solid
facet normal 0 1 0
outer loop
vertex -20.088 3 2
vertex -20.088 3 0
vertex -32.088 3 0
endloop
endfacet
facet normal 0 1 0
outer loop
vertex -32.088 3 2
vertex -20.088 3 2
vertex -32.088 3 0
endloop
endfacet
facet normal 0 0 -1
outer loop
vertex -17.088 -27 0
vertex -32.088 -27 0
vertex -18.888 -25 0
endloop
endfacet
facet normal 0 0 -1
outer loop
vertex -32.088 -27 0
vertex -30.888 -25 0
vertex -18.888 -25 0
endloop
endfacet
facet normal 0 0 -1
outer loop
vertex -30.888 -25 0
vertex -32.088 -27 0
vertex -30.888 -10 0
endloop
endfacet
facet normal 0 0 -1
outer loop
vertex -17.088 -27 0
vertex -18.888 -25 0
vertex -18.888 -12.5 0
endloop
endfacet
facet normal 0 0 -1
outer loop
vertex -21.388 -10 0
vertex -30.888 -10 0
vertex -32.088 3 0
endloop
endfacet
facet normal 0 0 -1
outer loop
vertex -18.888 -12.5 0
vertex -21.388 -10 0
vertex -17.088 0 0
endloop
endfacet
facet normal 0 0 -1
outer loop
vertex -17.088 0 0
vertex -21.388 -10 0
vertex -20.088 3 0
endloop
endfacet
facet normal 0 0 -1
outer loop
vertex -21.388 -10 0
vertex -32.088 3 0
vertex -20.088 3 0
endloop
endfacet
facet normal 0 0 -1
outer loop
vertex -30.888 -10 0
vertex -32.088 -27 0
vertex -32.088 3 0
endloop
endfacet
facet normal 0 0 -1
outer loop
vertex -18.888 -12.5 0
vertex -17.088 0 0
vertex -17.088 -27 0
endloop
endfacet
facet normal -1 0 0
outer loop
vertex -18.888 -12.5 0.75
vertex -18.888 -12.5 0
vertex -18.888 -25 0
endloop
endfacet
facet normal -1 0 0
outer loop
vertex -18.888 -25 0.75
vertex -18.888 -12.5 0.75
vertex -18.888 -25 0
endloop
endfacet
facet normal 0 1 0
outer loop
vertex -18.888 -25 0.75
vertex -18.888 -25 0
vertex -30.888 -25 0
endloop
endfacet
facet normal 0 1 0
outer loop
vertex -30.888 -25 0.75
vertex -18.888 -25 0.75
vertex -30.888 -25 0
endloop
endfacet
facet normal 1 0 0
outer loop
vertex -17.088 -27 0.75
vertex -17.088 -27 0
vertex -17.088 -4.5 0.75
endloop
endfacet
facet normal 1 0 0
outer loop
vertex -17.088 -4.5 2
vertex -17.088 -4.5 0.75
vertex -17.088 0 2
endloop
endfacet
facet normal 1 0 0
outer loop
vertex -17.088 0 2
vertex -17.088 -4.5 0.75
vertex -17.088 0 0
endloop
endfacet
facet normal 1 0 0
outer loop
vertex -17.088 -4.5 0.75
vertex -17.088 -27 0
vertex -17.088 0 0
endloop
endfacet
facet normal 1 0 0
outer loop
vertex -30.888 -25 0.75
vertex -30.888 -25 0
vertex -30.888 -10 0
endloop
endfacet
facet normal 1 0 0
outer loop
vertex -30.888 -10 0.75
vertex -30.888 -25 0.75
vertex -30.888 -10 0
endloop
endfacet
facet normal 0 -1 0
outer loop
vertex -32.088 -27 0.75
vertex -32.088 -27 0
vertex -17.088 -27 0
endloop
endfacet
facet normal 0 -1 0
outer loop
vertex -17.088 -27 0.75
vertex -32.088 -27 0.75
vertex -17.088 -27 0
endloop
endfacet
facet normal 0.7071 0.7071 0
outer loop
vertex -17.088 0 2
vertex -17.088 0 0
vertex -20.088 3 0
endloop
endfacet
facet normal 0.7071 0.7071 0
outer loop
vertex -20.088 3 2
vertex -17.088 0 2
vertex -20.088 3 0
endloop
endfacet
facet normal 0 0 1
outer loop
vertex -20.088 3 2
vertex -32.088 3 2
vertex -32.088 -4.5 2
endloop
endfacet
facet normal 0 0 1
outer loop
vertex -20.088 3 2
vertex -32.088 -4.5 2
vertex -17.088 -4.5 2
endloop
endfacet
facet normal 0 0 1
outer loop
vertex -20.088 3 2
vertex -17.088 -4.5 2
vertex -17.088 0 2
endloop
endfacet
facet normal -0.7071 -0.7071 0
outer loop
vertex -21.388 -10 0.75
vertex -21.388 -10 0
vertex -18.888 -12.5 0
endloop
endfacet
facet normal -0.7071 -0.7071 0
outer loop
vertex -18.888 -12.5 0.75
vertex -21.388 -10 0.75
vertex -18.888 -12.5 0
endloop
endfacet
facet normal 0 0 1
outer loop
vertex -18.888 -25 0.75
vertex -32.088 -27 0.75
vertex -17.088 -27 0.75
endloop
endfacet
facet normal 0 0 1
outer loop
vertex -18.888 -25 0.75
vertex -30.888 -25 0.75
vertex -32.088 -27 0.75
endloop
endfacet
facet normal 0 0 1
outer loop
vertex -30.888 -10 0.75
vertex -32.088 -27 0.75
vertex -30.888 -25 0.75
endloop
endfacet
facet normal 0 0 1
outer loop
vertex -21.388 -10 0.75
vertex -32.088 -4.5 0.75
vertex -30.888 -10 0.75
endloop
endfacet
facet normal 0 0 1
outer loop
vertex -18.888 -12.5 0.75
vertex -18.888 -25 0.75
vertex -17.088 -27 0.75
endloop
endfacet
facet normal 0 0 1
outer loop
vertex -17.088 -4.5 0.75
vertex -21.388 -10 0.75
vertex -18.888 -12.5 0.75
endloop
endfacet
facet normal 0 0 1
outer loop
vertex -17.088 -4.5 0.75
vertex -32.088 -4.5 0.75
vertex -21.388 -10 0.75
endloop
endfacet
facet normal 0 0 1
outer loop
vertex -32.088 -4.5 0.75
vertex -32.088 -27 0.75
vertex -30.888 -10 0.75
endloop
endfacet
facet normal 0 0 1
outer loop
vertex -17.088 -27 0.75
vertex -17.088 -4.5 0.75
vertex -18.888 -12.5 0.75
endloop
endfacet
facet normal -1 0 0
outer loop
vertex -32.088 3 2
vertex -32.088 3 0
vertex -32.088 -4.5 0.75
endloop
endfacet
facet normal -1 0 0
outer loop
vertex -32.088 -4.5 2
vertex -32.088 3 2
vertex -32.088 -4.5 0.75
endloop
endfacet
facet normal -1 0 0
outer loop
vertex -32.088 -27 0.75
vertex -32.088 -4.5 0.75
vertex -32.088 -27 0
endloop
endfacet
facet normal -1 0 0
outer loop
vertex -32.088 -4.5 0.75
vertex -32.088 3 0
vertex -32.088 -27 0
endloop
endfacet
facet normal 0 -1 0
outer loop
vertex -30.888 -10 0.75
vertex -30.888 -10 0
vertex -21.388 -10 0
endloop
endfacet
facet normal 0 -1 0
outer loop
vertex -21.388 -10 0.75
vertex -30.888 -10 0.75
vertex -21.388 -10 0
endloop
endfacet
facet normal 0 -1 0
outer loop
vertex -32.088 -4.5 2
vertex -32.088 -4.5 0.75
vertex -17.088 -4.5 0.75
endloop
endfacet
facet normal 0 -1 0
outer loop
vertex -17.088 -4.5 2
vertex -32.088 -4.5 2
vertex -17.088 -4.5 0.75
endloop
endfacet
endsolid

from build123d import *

# Parameters (mm, degrees)
F0_W     = 15
F0_H     = 22.5
F1_DEPTH = 0.75
F2_DEPTH = 2


with BuildPart() as f1:
    # F0 (on Top) → F1 (new body)
    with BuildSketch(Plane.XY):
        with Locations((-24.588022, -15.75)):
            Rectangle(F0_W, F0_H)
        Polygon((-18.888022, -25), (-30.888022, -25), (-30.888022, -10), (-21.388022, -10), (-18.888022, -12.5), align=None, mode=Mode.SUBTRACT)
    extrude(amount=F1_DEPTH)

    # F0 (on Top) → F2 (join)
    with BuildSketch(Plane.XY):
        Polygon((-32.088022, 3), (-32.088022, -4.5), (-17.088022, -4.5), (-17.088022, 0), (-20.088022, 3), align=None)
    extrude(amount=F2_DEPTH)


solid = f1.part
